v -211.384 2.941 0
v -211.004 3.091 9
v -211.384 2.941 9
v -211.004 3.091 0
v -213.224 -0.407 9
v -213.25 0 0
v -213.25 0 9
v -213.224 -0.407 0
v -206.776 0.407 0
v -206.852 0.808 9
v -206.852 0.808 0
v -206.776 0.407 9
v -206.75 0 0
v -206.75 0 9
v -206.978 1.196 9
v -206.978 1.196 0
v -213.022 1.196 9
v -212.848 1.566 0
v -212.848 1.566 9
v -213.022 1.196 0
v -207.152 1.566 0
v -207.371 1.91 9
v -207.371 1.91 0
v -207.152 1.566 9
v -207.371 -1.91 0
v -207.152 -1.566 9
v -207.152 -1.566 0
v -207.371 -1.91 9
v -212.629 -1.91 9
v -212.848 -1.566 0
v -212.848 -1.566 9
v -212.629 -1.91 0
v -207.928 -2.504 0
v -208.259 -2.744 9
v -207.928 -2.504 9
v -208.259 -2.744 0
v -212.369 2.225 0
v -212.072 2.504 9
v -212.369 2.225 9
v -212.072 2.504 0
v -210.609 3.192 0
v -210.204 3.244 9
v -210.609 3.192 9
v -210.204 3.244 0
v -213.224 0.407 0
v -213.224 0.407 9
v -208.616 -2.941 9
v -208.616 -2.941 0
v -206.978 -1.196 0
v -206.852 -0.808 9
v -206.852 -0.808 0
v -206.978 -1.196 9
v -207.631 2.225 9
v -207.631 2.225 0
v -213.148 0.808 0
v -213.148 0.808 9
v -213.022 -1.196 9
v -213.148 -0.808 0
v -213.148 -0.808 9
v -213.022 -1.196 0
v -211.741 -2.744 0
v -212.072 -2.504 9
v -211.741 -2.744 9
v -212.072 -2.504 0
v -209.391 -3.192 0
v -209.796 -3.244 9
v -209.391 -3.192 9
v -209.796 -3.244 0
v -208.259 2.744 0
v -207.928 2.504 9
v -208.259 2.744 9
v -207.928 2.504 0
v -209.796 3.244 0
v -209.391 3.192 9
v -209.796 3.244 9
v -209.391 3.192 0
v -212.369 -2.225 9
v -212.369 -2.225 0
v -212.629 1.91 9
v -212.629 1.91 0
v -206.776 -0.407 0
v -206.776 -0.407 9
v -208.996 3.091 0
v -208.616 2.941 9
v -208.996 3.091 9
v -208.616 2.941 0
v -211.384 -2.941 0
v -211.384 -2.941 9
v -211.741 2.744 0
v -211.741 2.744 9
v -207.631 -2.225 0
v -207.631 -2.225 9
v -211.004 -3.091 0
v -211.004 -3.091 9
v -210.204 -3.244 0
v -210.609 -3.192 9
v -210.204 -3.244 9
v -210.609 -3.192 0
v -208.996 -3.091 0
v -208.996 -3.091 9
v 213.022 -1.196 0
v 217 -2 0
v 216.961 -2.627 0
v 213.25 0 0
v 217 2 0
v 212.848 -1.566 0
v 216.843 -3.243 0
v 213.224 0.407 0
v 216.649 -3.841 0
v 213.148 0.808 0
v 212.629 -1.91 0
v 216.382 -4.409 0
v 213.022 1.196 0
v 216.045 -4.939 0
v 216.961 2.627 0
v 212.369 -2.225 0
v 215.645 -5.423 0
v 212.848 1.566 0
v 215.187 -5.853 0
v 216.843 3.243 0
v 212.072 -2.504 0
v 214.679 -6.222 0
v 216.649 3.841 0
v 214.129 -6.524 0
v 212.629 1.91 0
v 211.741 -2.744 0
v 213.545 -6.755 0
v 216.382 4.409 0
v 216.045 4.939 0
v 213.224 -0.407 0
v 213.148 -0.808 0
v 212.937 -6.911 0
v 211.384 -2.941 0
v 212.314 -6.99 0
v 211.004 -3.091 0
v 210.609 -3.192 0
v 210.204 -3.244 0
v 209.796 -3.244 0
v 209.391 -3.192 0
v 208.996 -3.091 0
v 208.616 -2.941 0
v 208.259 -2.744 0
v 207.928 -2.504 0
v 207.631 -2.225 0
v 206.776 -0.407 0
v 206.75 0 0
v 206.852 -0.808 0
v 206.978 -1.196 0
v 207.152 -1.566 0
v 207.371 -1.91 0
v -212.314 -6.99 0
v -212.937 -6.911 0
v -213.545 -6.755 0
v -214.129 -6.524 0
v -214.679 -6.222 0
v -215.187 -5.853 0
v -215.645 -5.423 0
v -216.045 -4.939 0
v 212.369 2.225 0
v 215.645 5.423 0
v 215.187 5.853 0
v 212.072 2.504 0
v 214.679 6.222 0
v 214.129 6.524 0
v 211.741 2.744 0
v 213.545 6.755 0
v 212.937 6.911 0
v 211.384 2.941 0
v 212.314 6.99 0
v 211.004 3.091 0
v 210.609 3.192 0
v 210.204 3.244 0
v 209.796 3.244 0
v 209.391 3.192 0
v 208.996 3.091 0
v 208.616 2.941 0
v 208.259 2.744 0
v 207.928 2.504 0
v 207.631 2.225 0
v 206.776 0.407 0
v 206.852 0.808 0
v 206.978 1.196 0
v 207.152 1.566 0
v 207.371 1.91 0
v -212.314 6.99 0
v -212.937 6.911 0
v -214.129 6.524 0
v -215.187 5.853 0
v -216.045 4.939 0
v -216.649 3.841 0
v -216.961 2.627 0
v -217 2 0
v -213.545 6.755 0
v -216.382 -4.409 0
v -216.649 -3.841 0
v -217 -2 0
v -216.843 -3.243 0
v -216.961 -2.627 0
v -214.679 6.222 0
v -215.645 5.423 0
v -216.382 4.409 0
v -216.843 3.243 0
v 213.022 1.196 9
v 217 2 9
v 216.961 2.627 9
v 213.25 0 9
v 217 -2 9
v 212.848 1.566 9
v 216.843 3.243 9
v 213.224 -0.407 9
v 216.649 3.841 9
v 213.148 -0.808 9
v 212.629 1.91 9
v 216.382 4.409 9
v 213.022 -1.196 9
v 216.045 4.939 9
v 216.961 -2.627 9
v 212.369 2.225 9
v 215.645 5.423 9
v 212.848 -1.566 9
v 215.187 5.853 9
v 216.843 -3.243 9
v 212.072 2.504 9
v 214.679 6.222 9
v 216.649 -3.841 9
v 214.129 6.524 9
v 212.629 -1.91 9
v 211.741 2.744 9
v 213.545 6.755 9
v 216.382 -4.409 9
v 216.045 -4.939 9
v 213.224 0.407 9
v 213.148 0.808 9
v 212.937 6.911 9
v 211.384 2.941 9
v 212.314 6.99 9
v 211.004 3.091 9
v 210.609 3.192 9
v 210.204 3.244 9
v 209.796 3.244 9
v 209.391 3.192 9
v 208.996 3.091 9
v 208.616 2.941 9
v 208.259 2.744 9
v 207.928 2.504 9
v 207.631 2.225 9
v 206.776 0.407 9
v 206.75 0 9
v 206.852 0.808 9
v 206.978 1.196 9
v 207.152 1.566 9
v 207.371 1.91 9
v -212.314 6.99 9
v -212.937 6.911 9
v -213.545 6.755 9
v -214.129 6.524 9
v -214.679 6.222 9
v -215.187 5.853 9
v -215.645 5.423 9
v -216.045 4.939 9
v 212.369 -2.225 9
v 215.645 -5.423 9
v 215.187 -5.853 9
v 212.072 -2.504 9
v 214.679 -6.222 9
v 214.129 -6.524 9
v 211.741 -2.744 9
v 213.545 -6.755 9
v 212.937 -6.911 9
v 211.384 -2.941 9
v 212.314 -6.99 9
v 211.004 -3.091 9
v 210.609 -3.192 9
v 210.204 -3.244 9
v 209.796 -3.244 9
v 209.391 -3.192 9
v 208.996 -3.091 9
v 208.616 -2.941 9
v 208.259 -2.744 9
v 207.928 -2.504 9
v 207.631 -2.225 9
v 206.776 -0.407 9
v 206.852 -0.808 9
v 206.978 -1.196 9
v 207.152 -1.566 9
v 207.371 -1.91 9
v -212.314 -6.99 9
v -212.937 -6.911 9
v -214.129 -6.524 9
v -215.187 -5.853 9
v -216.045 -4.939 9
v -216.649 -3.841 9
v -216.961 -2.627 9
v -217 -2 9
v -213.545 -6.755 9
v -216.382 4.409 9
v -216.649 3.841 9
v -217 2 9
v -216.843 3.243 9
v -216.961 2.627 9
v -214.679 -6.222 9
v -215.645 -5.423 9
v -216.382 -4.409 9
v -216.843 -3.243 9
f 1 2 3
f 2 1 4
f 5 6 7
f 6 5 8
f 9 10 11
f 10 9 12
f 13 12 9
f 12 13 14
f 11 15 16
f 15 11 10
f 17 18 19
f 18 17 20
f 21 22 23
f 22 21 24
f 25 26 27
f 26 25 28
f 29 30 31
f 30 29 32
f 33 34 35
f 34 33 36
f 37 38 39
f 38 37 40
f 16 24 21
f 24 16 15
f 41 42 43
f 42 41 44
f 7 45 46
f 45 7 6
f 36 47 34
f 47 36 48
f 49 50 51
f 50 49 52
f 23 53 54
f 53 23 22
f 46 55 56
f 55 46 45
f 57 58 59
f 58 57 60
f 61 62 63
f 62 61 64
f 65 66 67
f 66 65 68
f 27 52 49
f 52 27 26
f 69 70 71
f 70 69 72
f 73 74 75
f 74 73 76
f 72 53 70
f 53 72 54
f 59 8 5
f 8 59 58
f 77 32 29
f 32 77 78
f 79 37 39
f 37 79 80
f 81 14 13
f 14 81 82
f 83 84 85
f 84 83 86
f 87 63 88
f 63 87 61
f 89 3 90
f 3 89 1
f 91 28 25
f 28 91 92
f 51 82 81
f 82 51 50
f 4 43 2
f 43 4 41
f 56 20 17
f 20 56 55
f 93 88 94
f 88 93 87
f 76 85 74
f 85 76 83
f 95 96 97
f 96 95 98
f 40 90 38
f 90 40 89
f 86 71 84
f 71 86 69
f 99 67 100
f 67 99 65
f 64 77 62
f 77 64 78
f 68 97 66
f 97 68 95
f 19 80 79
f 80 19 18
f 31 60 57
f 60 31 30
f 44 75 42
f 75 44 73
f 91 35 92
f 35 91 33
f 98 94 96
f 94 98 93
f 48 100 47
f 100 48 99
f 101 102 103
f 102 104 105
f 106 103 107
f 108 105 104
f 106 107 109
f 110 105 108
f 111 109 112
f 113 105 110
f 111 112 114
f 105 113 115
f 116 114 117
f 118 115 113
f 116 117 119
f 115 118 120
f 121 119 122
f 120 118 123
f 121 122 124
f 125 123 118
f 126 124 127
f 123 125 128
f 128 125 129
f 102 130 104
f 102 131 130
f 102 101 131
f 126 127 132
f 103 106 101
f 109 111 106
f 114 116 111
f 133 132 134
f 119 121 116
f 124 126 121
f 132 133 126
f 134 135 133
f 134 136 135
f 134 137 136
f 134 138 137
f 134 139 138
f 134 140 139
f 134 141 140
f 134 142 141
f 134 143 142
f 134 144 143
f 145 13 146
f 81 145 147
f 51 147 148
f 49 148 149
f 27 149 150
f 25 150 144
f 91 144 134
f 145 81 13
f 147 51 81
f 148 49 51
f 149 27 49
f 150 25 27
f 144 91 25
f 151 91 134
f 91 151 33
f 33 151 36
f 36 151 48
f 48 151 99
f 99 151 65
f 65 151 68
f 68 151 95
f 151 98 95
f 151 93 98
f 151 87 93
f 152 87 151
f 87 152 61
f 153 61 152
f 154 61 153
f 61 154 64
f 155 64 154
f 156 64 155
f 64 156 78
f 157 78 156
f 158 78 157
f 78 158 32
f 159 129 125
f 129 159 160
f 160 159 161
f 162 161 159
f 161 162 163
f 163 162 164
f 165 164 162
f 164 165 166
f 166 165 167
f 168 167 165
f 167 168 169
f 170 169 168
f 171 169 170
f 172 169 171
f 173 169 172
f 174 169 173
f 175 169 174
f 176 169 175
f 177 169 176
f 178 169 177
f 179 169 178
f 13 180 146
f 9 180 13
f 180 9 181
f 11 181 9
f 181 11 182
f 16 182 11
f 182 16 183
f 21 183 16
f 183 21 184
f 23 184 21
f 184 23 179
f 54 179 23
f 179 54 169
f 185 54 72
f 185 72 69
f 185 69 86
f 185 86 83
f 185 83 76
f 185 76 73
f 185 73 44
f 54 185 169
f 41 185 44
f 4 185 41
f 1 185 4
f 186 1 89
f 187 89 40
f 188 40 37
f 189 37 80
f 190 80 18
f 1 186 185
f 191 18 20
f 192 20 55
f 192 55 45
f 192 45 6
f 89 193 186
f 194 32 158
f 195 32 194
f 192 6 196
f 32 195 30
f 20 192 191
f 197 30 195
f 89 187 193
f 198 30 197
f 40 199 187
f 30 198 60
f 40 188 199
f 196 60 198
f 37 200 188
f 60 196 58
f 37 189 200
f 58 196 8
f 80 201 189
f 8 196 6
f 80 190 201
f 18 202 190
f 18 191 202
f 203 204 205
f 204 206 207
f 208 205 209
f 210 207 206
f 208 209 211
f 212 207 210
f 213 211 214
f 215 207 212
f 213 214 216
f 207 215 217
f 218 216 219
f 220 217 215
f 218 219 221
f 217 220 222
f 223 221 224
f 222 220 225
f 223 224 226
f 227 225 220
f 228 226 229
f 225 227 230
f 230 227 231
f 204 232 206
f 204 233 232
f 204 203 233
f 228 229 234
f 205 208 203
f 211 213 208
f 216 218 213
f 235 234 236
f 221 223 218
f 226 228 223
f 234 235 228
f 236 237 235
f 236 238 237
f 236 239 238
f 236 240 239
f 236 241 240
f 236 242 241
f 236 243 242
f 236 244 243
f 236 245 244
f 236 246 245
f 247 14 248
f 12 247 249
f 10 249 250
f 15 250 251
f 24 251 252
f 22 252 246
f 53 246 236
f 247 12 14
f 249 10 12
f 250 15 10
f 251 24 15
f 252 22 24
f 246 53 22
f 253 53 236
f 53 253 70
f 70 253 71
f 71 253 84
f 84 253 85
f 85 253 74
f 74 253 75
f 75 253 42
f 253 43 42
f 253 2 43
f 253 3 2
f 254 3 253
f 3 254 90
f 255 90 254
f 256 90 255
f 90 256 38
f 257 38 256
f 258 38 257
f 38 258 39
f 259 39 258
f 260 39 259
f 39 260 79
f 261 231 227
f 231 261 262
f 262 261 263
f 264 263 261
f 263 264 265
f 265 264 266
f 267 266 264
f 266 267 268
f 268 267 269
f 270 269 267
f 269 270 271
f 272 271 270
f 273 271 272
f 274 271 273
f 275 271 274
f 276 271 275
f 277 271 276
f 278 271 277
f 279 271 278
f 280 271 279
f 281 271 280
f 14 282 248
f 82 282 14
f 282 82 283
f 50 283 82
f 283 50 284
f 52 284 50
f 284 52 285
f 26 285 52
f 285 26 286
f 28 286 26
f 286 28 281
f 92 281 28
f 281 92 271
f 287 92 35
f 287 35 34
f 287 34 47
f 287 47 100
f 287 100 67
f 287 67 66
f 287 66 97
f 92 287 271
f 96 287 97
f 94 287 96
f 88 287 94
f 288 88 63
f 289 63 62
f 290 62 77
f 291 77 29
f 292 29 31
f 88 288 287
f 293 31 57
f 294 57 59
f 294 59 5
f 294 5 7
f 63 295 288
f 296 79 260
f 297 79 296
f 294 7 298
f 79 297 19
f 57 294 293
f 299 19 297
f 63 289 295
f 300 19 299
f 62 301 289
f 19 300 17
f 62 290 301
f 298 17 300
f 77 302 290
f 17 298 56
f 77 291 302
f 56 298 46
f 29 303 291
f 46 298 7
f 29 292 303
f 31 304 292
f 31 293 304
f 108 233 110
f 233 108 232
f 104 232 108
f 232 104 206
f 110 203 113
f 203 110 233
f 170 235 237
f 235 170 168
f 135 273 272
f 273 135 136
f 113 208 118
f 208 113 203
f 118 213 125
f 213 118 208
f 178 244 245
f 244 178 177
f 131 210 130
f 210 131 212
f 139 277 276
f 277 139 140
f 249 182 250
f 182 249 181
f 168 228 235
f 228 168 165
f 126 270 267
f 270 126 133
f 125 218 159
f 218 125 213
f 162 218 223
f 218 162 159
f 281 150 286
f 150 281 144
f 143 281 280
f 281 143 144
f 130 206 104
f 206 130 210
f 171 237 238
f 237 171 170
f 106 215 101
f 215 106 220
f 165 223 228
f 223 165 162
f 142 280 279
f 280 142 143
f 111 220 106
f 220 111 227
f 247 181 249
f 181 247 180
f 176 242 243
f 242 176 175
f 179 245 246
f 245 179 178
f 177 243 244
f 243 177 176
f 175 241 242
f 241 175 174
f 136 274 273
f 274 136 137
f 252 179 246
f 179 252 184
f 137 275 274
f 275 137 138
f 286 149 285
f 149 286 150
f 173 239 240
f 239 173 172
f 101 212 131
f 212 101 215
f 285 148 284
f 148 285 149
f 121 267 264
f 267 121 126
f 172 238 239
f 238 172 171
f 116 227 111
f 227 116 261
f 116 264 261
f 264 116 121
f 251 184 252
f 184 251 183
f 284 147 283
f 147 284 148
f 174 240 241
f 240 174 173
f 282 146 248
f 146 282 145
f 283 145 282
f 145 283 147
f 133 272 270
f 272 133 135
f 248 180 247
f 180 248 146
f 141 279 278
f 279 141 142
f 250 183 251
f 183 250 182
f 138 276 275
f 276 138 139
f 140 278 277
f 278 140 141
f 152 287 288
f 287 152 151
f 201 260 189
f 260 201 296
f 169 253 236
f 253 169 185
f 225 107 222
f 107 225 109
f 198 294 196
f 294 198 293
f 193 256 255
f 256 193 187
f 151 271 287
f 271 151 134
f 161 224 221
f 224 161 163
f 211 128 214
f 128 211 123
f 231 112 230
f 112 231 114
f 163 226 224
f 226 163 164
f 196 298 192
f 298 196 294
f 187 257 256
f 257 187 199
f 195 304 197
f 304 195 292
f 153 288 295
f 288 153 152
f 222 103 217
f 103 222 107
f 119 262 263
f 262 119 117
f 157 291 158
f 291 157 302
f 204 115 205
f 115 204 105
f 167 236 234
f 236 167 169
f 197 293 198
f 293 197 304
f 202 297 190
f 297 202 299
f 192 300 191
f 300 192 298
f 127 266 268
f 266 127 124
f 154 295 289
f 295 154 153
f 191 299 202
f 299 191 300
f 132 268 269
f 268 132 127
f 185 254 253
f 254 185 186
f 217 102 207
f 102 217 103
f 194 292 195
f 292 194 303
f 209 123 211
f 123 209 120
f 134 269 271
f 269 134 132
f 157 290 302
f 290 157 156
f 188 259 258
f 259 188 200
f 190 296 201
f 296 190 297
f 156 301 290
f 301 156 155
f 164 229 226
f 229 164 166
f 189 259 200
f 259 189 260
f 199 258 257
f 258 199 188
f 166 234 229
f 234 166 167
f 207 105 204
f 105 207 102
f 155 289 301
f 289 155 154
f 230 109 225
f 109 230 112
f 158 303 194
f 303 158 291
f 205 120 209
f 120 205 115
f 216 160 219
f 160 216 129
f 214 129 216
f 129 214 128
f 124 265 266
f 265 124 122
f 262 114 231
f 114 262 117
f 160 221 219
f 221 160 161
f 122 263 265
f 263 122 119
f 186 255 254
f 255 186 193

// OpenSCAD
$fn = 50;


difference() {
	union() {
		hull() {
			translate(v = [-212.0000000000, 2.0000000000, 0]) {
				cylinder(h = 9, r = 5);
			}
			translate(v = [212.0000000000, 2.0000000000, 0]) {
				cylinder(h = 9, r = 5);
			}
			translate(v = [-212.0000000000, -2.0000000000, 0]) {
				cylinder(h = 9, r = 5);
			}
			translate(v = [212.0000000000, -2.0000000000, 0]) {
				cylinder(h = 9, r = 5);
			}
		}
	}
	union() {
		translate(v = [-210.0000000000, 0.0000000000, 0]) {
			cylinder(h = 9, r = 3.2500000000);
		}
		translate(v = [210.0000000000, 0.0000000000, 0]) {
			cylinder(h = 9, r = 3.2500000000);
		}
		translate(v = [-210.0000000000, 0.0000000000, 0]) {
			cylinder(h = 9, r = 1.8000000000);
		}
		translate(v = [210.0000000000, 0.0000000000, 0]) {
			cylinder(h = 9, r = 1.8000000000);
		}
		translate(v = [-210.0000000000, 0.0000000000, 0]) {
			cylinder(h = 9, r = 1.8000000000);
		}
		translate(v = [210.0000000000, 0.0000000000, 0]) {
			cylinder(h = 9, r = 1.8000000000);
		}
		translate(v = [-210.0000000000, 0.0000000000, 0]) {
			cylinder(h = 9, r = 1.8000000000);
		}
		translate(v = [210.0000000000, 0.0000000000, 0]) {
			cylinder(h = 9, r = 1.8000000000);
		}
	}
}
